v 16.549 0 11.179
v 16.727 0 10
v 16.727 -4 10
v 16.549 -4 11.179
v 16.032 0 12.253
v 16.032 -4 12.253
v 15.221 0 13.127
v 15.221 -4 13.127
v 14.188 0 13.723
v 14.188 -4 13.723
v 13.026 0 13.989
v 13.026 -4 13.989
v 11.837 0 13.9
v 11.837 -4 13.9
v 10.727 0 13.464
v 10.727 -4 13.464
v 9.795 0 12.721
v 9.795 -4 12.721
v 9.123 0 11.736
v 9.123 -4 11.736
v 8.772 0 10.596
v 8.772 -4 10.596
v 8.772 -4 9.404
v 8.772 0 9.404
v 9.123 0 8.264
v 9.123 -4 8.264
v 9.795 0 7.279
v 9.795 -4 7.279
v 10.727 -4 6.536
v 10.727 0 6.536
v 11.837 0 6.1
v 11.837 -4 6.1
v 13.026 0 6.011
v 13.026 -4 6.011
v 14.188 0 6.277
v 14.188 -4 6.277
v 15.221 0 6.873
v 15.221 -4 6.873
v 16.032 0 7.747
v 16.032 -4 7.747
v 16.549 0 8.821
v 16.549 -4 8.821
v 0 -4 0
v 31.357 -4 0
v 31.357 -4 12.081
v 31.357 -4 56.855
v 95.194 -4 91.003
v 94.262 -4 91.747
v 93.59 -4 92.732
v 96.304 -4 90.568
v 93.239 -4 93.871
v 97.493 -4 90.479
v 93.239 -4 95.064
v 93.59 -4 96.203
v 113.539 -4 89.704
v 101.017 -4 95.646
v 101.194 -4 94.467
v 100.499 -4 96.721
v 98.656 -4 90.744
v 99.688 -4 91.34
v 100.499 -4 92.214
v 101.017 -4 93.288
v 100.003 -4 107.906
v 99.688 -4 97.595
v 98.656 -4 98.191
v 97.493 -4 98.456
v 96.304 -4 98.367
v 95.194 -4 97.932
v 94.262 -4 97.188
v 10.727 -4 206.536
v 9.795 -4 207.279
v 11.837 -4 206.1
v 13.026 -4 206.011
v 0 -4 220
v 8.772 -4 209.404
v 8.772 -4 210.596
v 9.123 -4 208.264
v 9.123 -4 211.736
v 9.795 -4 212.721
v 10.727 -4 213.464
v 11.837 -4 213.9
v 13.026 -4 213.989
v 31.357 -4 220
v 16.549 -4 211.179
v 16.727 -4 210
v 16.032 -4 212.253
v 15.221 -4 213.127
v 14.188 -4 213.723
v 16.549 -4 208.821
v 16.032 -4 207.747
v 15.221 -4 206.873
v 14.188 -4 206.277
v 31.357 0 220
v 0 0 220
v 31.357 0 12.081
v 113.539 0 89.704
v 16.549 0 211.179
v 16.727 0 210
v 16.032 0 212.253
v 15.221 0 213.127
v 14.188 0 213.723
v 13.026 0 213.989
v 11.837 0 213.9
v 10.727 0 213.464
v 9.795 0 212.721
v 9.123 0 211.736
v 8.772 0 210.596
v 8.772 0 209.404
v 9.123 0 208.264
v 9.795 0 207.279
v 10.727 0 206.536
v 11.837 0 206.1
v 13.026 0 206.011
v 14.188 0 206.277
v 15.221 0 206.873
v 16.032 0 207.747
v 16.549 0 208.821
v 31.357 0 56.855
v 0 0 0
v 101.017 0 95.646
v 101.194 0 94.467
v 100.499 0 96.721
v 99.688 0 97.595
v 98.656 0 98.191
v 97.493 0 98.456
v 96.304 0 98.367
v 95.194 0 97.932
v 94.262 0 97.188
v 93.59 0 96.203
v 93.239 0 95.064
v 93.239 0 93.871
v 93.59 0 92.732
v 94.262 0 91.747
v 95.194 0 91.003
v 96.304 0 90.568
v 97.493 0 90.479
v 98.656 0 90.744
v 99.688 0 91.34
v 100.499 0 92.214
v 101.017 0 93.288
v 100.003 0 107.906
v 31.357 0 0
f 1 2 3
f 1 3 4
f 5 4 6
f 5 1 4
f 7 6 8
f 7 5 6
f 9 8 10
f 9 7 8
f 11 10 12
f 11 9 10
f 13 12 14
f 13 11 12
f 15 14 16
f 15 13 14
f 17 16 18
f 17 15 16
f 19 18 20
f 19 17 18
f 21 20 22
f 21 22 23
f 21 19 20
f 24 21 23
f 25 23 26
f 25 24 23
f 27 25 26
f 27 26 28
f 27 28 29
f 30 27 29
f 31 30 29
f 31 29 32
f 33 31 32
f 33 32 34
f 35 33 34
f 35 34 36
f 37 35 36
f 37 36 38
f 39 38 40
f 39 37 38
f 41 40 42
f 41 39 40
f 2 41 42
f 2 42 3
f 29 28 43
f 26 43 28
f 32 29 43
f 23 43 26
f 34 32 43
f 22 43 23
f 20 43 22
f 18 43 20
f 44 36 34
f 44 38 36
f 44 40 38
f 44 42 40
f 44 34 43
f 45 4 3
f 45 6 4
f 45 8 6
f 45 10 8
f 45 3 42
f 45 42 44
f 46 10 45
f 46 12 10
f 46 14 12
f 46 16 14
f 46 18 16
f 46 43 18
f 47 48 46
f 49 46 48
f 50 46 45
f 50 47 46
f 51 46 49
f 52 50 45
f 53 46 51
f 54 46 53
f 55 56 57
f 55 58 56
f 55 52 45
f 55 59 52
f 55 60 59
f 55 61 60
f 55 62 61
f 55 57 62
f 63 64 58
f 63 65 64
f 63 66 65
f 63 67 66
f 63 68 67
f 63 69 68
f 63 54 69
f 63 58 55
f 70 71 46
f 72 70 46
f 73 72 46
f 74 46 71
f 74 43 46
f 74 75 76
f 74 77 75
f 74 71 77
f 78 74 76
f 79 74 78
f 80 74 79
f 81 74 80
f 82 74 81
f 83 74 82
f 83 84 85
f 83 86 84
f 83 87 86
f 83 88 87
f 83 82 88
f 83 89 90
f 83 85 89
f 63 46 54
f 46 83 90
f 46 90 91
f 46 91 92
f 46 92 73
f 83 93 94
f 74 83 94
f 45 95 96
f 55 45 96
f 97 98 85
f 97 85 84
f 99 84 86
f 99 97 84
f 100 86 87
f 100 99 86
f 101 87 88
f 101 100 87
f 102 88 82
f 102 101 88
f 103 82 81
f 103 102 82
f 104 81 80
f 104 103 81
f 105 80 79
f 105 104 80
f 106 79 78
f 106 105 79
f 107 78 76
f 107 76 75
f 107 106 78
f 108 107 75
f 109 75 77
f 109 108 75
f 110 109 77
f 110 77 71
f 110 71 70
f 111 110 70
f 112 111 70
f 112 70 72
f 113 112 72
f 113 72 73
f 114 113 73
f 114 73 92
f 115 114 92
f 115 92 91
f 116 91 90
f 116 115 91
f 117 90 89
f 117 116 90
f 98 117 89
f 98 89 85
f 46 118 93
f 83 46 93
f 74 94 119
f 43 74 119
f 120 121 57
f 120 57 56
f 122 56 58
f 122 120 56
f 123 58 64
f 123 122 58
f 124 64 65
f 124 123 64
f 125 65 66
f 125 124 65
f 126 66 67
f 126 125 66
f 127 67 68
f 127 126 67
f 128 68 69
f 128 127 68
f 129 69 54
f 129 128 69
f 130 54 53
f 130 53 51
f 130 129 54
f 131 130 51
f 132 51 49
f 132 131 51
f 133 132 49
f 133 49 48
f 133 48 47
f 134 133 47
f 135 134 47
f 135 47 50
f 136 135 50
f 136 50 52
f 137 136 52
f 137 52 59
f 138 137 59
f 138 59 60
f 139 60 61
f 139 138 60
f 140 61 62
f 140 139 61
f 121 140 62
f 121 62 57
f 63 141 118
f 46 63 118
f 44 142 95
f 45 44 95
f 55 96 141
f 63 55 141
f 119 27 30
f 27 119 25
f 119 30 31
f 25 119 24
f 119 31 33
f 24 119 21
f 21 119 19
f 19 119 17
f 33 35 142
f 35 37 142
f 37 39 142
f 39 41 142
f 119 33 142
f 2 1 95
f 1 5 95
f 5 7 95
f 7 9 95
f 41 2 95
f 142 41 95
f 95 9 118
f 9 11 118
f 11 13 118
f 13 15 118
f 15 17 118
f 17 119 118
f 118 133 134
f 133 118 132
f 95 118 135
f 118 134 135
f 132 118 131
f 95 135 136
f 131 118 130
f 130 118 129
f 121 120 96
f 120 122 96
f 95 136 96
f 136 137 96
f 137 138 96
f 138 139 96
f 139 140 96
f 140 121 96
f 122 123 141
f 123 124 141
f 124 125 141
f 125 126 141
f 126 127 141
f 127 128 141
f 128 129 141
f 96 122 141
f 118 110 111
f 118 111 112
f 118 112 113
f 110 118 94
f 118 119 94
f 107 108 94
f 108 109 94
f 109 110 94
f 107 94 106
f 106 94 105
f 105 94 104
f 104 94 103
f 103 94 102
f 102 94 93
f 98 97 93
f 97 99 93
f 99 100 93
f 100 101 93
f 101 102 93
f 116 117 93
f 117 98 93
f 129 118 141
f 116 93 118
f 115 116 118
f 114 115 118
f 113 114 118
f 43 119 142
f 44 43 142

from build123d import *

# Parameters (mm, degrees)
F0_R     = 4
F1_DEPTH = 4


with BuildPart() as f1:
    # F0 (on Front) → F1 (new body)
    with BuildSketch(Plane.XZ):
        Polygon((0, 220), (0, 0), (31.35714, 0), (31.35714, 12.080761), (113.539034, 89.704465), (100.003339, 107.905552), (31.35714, 56.855083), (31.35714, 220), align=None)
        with Locations((12.726834, 10)):
            Circle(F0_R, mode=Mode.SUBTRACT)
        with Locations((97.194239, 94.467405)):
            Circle(F0_R, mode=Mode.SUBTRACT)
        with Locations((12.726834, 210)):
            Circle(F0_R, mode=Mode.SUBTRACT)
    extrude(amount=F1_DEPTH)


solid = f1.part
